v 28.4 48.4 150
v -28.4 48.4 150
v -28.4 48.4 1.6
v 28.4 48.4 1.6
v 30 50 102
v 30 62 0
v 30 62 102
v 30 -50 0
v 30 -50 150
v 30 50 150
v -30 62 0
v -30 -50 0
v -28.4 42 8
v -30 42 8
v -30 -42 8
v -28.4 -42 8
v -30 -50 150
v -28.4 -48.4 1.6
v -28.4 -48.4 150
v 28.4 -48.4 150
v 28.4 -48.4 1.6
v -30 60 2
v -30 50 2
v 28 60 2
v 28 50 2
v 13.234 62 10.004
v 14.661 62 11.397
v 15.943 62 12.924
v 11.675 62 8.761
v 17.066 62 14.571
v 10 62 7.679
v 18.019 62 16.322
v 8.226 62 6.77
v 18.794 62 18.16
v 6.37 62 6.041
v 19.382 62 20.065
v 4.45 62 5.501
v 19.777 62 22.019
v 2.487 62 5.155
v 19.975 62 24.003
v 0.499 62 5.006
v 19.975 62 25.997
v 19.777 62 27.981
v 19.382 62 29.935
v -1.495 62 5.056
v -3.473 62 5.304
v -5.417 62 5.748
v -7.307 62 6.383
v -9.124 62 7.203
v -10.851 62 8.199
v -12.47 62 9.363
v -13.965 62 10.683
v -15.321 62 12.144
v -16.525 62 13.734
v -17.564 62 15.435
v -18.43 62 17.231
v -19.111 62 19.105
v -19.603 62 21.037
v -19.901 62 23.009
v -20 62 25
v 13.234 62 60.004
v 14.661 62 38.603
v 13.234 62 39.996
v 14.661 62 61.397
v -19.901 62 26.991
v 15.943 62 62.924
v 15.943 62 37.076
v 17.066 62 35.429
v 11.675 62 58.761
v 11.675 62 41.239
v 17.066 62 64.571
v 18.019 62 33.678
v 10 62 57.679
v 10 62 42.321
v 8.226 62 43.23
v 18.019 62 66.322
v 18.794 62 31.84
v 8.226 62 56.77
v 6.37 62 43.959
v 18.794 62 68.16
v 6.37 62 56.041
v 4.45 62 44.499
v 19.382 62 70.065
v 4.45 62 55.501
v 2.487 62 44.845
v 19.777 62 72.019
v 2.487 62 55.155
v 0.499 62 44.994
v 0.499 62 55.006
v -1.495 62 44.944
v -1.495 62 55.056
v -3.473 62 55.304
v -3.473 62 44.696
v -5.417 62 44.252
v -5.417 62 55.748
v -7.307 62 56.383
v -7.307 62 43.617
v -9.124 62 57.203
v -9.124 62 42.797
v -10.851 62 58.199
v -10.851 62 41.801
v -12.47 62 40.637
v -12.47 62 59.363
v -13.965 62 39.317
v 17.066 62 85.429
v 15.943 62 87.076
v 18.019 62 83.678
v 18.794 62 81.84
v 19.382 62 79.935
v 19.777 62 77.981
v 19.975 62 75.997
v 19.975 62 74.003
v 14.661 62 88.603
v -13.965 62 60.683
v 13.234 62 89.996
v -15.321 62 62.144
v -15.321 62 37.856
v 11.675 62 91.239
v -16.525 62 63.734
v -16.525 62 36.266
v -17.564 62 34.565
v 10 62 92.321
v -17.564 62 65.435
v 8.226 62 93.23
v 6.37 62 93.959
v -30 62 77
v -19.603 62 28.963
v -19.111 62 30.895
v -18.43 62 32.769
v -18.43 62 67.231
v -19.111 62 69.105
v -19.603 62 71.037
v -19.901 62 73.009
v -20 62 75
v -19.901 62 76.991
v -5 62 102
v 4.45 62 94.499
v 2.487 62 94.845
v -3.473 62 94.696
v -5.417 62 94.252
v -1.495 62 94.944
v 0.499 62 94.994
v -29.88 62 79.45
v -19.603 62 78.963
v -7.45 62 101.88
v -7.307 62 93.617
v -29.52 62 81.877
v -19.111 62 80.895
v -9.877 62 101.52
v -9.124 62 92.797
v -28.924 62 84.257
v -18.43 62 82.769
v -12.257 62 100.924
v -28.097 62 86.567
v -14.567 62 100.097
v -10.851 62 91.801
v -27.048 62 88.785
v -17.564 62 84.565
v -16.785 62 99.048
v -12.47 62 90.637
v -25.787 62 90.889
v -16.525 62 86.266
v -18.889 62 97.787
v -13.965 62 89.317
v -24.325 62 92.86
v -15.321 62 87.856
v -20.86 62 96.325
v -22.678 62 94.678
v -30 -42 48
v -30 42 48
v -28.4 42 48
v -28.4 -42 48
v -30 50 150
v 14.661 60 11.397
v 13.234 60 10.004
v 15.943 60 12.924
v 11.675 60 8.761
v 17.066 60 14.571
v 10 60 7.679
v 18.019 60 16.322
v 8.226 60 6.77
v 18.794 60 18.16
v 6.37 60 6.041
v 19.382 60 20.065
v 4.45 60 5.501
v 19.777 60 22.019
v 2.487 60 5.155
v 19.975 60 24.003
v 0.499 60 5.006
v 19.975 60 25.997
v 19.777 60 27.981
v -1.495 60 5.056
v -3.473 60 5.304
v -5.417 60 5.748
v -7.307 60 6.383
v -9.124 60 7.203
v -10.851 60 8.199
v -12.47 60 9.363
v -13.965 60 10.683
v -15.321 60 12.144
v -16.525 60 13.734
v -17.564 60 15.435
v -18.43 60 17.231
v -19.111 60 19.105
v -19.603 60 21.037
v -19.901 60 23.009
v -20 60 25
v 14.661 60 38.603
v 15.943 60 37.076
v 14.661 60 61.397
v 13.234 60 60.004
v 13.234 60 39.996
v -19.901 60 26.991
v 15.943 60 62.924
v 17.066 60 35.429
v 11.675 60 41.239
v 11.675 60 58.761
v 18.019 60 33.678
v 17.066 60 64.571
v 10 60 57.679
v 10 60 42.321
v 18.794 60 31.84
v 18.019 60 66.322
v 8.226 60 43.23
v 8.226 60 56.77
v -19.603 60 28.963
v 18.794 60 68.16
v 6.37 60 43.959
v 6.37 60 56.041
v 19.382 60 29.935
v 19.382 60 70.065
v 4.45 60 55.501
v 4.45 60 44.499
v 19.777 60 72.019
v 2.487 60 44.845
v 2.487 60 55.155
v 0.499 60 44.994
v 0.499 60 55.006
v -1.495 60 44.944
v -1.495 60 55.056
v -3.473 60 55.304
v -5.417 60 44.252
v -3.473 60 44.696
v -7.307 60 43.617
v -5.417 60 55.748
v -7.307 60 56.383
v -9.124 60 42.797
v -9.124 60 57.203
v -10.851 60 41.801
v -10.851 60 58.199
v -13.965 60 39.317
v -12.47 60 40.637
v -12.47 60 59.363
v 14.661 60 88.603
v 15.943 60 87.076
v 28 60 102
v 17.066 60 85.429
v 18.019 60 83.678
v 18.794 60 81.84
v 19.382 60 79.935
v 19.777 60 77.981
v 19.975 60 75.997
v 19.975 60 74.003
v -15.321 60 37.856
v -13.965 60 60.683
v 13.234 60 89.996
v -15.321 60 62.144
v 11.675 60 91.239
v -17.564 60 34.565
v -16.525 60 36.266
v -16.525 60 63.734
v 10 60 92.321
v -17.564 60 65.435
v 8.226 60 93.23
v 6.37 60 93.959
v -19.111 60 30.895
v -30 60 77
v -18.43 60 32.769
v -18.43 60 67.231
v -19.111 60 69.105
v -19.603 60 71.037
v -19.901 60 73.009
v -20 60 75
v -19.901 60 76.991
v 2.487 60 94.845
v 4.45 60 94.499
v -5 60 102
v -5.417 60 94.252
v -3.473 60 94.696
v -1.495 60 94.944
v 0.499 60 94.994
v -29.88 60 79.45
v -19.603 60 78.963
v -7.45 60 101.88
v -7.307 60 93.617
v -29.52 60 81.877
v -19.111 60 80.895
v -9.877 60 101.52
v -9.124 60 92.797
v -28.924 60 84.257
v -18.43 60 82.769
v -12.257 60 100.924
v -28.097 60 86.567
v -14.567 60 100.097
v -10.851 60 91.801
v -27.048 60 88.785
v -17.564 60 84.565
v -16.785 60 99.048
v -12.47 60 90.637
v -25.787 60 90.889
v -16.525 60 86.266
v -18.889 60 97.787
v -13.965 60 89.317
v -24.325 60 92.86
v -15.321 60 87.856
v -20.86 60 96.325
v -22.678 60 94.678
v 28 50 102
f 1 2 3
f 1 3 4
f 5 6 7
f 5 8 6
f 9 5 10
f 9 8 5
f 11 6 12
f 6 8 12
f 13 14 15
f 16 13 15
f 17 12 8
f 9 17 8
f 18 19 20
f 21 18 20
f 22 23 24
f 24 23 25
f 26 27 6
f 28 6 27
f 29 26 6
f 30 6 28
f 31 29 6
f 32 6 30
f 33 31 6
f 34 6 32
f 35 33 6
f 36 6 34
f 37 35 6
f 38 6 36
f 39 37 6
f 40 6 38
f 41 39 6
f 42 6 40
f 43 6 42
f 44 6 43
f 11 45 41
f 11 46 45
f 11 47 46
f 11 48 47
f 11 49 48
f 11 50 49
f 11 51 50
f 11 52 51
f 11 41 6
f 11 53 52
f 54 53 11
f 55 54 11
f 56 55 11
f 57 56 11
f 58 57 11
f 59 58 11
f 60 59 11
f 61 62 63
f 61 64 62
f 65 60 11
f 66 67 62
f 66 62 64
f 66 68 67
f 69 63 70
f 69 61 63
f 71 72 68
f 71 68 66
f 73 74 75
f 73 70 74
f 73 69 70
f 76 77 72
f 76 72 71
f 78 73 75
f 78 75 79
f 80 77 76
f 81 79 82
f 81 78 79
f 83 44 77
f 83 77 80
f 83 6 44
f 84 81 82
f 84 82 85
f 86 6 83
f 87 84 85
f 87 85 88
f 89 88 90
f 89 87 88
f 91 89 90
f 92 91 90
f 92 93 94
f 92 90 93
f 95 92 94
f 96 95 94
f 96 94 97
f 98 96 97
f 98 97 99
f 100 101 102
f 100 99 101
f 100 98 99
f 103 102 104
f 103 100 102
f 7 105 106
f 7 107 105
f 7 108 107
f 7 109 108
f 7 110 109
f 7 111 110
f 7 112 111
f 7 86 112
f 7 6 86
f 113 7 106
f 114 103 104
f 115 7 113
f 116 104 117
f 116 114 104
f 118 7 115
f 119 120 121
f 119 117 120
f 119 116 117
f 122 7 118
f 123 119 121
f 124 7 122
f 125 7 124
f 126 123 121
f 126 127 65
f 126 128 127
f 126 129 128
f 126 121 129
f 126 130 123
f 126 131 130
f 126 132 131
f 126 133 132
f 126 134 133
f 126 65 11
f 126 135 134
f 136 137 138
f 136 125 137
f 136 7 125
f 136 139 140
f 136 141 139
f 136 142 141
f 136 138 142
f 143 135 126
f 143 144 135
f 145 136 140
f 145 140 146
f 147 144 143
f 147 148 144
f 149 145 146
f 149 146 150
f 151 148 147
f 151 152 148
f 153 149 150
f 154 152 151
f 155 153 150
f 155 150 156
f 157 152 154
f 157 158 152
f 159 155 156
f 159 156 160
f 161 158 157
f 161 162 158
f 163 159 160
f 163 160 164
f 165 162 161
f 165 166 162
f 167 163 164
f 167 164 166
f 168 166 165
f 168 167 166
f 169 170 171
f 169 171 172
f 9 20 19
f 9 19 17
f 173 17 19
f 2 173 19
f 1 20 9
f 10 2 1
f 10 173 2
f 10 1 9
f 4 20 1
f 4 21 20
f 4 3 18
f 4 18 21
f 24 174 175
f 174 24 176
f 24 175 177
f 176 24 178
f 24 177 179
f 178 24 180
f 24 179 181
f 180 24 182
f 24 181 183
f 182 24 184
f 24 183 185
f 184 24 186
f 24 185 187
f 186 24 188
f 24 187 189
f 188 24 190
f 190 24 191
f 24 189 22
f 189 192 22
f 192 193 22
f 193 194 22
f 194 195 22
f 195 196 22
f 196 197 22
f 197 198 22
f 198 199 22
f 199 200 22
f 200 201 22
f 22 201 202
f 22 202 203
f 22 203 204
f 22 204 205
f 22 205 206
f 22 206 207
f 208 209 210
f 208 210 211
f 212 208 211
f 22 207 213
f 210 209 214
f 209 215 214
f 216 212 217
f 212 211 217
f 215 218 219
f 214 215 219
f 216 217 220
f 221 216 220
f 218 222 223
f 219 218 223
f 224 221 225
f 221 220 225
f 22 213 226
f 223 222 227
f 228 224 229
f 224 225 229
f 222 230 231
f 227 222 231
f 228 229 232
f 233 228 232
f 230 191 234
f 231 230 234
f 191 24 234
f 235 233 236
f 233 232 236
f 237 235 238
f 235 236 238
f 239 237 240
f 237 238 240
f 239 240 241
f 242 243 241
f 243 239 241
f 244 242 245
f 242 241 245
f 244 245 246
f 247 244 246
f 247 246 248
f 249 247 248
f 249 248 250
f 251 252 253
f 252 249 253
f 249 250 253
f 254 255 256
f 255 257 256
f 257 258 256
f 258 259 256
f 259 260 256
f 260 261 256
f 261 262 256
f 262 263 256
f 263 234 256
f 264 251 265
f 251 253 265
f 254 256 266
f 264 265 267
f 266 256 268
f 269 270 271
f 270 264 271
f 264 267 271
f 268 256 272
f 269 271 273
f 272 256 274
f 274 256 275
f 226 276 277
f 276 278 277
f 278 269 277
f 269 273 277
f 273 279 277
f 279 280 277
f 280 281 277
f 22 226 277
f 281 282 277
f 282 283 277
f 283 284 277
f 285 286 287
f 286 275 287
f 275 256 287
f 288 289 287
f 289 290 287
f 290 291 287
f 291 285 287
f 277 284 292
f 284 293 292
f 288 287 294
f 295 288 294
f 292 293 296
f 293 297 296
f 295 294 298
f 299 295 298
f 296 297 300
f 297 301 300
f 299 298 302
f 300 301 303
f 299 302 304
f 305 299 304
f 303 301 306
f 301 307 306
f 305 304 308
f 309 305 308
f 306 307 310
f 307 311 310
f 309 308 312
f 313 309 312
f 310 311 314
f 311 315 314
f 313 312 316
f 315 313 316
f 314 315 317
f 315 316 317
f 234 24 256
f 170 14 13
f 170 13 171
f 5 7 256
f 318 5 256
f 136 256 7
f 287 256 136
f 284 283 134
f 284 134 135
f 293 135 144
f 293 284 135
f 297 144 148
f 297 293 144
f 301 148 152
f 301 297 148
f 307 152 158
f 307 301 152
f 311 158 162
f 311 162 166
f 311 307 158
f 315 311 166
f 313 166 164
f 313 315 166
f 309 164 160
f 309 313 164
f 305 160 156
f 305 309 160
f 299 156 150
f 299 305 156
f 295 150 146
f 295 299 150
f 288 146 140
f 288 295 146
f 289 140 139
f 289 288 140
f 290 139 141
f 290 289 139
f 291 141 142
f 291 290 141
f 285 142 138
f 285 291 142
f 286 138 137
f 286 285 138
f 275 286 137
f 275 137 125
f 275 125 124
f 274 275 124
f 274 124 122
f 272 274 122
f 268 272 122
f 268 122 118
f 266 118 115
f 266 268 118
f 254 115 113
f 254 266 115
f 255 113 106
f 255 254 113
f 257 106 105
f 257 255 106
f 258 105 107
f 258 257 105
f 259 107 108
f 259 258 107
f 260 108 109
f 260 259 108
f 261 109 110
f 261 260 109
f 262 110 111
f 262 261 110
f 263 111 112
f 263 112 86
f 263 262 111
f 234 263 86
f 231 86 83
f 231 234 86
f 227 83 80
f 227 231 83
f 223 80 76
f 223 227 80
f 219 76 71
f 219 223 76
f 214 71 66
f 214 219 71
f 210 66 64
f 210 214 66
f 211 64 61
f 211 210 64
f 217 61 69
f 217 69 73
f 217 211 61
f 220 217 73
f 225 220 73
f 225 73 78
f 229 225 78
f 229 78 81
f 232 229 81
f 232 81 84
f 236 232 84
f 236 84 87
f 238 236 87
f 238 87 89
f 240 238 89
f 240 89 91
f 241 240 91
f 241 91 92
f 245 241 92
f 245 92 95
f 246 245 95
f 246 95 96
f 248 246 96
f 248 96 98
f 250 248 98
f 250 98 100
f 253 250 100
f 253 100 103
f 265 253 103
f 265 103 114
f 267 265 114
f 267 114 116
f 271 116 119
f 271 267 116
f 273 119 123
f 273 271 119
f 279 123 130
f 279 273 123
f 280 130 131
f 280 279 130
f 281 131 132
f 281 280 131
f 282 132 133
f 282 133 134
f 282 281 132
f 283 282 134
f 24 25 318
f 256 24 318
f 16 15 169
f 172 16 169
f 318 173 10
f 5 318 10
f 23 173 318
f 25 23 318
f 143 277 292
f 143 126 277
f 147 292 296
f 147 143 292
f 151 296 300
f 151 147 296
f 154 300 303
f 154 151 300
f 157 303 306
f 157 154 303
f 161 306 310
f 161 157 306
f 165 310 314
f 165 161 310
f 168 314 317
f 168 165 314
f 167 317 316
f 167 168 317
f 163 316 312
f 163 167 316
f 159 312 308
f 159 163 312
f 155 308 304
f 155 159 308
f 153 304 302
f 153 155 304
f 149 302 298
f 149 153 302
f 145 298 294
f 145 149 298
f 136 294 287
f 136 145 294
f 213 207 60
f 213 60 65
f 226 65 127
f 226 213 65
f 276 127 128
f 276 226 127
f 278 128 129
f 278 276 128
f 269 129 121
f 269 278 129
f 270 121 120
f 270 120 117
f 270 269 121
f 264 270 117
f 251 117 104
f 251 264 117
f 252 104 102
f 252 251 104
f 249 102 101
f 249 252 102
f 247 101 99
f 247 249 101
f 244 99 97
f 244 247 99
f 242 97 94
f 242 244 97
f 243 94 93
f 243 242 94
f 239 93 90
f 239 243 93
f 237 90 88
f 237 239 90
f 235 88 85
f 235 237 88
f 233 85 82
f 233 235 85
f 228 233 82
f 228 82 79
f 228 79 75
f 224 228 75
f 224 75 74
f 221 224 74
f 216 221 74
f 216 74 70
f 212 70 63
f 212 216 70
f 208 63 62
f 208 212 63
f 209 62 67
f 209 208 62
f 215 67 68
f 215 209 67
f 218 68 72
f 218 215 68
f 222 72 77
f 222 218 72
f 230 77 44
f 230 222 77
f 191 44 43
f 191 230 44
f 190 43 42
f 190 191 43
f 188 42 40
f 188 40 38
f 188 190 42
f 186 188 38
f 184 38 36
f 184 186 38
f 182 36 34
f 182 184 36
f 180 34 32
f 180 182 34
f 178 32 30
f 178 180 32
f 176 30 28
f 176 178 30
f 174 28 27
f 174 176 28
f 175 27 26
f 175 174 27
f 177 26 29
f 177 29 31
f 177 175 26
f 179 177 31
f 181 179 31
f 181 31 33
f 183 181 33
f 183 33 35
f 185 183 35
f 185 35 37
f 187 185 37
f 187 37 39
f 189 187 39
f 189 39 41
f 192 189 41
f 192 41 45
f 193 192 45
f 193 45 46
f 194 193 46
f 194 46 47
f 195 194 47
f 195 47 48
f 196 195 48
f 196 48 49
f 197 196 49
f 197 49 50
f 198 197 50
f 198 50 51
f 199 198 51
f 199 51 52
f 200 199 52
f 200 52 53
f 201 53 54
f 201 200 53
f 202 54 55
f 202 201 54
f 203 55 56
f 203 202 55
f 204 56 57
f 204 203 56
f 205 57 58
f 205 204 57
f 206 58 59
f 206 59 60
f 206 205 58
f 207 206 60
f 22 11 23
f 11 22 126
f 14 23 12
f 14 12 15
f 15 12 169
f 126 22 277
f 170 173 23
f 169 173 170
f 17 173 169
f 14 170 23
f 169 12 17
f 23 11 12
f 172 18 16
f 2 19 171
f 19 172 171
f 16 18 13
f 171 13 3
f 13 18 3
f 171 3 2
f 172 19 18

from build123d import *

# Parameters (mm, degrees)
SKETCH_W     = 60
SKETCH_H     = 100
PAD_DEPTH    = 150
THICKNESS_T  = -1.6
SKETCH001_W  = 84
SKETCH001_H  = 40
POCKET_DEPTH = 1.6
PAD001_DEPTH = 10
SKETCH003_W  = 60
SKETCH003_H  = 102
SKETCH003_R  = 20
PAD002_DEPTH = 2
FILLET_R     = 25


with BuildPart() as part:
    # Sketch → Pad (new body)
    with BuildSketch(Plane.XY):
        Rectangle(SKETCH_W, SKETCH_H)
    extrude(amount=PAD_DEPTH)

    # Thickness
    thickness_openings = [part.faces().sort_by_distance(p)[0] for p in [
        (0, 0, 150),
    ]]
    offset(amount=THICKNESS_T, openings=thickness_openings)

    # Sketch001 (on Face4 of Thickness) → Pocket (cut)
    with BuildSketch(Plane(origin=(-30, 0, 0), x_dir=(0, -1, 0), z_dir=(-1, 0, 0))):
        with Locations((0, 28)):
            Rectangle(SKETCH001_W, SKETCH001_H)
    extrude(amount=-POCKET_DEPTH, mode=Mode.SUBTRACT)

    # Sketch002 (on Face6 of Pocket) → Pad001 (join)
    with BuildSketch(Plane(origin=(0, 50, 0), x_dir=(-1, 0, 0), z_dir=(0, 1, 0))):
        Polygon((-30, 102), (-30, 0), (30, 0), (30, 2), (-28, 2), (-28, 102), align=None)
    extrude(amount=PAD001_DEPTH)

    # Sketch003 (on Face19 of Pad001) → Pad002 (join)
    with BuildSketch(Plane(origin=(0, 60, 0), x_dir=(-1, 0, 0), z_dir=(0, 1, 0))):
        with Locations((0, 51)):
            Rectangle(SKETCH003_W, SKETCH003_H)
        with Locations((0, 75)):
            Circle(SKETCH003_R, mode=Mode.SUBTRACT)
        with Locations((0, 25)):
            Circle(SKETCH003_R, mode=Mode.SUBTRACT)
    extrude(amount=PAD002_DEPTH)

    # Fillet
    fillet_edges = [part.edges().sort_by_distance(p)[0] for p in [
        (-30, 61, 102),
    ]]
    fillet(fillet_edges, radius=FILLET_R)


solid = part.part
